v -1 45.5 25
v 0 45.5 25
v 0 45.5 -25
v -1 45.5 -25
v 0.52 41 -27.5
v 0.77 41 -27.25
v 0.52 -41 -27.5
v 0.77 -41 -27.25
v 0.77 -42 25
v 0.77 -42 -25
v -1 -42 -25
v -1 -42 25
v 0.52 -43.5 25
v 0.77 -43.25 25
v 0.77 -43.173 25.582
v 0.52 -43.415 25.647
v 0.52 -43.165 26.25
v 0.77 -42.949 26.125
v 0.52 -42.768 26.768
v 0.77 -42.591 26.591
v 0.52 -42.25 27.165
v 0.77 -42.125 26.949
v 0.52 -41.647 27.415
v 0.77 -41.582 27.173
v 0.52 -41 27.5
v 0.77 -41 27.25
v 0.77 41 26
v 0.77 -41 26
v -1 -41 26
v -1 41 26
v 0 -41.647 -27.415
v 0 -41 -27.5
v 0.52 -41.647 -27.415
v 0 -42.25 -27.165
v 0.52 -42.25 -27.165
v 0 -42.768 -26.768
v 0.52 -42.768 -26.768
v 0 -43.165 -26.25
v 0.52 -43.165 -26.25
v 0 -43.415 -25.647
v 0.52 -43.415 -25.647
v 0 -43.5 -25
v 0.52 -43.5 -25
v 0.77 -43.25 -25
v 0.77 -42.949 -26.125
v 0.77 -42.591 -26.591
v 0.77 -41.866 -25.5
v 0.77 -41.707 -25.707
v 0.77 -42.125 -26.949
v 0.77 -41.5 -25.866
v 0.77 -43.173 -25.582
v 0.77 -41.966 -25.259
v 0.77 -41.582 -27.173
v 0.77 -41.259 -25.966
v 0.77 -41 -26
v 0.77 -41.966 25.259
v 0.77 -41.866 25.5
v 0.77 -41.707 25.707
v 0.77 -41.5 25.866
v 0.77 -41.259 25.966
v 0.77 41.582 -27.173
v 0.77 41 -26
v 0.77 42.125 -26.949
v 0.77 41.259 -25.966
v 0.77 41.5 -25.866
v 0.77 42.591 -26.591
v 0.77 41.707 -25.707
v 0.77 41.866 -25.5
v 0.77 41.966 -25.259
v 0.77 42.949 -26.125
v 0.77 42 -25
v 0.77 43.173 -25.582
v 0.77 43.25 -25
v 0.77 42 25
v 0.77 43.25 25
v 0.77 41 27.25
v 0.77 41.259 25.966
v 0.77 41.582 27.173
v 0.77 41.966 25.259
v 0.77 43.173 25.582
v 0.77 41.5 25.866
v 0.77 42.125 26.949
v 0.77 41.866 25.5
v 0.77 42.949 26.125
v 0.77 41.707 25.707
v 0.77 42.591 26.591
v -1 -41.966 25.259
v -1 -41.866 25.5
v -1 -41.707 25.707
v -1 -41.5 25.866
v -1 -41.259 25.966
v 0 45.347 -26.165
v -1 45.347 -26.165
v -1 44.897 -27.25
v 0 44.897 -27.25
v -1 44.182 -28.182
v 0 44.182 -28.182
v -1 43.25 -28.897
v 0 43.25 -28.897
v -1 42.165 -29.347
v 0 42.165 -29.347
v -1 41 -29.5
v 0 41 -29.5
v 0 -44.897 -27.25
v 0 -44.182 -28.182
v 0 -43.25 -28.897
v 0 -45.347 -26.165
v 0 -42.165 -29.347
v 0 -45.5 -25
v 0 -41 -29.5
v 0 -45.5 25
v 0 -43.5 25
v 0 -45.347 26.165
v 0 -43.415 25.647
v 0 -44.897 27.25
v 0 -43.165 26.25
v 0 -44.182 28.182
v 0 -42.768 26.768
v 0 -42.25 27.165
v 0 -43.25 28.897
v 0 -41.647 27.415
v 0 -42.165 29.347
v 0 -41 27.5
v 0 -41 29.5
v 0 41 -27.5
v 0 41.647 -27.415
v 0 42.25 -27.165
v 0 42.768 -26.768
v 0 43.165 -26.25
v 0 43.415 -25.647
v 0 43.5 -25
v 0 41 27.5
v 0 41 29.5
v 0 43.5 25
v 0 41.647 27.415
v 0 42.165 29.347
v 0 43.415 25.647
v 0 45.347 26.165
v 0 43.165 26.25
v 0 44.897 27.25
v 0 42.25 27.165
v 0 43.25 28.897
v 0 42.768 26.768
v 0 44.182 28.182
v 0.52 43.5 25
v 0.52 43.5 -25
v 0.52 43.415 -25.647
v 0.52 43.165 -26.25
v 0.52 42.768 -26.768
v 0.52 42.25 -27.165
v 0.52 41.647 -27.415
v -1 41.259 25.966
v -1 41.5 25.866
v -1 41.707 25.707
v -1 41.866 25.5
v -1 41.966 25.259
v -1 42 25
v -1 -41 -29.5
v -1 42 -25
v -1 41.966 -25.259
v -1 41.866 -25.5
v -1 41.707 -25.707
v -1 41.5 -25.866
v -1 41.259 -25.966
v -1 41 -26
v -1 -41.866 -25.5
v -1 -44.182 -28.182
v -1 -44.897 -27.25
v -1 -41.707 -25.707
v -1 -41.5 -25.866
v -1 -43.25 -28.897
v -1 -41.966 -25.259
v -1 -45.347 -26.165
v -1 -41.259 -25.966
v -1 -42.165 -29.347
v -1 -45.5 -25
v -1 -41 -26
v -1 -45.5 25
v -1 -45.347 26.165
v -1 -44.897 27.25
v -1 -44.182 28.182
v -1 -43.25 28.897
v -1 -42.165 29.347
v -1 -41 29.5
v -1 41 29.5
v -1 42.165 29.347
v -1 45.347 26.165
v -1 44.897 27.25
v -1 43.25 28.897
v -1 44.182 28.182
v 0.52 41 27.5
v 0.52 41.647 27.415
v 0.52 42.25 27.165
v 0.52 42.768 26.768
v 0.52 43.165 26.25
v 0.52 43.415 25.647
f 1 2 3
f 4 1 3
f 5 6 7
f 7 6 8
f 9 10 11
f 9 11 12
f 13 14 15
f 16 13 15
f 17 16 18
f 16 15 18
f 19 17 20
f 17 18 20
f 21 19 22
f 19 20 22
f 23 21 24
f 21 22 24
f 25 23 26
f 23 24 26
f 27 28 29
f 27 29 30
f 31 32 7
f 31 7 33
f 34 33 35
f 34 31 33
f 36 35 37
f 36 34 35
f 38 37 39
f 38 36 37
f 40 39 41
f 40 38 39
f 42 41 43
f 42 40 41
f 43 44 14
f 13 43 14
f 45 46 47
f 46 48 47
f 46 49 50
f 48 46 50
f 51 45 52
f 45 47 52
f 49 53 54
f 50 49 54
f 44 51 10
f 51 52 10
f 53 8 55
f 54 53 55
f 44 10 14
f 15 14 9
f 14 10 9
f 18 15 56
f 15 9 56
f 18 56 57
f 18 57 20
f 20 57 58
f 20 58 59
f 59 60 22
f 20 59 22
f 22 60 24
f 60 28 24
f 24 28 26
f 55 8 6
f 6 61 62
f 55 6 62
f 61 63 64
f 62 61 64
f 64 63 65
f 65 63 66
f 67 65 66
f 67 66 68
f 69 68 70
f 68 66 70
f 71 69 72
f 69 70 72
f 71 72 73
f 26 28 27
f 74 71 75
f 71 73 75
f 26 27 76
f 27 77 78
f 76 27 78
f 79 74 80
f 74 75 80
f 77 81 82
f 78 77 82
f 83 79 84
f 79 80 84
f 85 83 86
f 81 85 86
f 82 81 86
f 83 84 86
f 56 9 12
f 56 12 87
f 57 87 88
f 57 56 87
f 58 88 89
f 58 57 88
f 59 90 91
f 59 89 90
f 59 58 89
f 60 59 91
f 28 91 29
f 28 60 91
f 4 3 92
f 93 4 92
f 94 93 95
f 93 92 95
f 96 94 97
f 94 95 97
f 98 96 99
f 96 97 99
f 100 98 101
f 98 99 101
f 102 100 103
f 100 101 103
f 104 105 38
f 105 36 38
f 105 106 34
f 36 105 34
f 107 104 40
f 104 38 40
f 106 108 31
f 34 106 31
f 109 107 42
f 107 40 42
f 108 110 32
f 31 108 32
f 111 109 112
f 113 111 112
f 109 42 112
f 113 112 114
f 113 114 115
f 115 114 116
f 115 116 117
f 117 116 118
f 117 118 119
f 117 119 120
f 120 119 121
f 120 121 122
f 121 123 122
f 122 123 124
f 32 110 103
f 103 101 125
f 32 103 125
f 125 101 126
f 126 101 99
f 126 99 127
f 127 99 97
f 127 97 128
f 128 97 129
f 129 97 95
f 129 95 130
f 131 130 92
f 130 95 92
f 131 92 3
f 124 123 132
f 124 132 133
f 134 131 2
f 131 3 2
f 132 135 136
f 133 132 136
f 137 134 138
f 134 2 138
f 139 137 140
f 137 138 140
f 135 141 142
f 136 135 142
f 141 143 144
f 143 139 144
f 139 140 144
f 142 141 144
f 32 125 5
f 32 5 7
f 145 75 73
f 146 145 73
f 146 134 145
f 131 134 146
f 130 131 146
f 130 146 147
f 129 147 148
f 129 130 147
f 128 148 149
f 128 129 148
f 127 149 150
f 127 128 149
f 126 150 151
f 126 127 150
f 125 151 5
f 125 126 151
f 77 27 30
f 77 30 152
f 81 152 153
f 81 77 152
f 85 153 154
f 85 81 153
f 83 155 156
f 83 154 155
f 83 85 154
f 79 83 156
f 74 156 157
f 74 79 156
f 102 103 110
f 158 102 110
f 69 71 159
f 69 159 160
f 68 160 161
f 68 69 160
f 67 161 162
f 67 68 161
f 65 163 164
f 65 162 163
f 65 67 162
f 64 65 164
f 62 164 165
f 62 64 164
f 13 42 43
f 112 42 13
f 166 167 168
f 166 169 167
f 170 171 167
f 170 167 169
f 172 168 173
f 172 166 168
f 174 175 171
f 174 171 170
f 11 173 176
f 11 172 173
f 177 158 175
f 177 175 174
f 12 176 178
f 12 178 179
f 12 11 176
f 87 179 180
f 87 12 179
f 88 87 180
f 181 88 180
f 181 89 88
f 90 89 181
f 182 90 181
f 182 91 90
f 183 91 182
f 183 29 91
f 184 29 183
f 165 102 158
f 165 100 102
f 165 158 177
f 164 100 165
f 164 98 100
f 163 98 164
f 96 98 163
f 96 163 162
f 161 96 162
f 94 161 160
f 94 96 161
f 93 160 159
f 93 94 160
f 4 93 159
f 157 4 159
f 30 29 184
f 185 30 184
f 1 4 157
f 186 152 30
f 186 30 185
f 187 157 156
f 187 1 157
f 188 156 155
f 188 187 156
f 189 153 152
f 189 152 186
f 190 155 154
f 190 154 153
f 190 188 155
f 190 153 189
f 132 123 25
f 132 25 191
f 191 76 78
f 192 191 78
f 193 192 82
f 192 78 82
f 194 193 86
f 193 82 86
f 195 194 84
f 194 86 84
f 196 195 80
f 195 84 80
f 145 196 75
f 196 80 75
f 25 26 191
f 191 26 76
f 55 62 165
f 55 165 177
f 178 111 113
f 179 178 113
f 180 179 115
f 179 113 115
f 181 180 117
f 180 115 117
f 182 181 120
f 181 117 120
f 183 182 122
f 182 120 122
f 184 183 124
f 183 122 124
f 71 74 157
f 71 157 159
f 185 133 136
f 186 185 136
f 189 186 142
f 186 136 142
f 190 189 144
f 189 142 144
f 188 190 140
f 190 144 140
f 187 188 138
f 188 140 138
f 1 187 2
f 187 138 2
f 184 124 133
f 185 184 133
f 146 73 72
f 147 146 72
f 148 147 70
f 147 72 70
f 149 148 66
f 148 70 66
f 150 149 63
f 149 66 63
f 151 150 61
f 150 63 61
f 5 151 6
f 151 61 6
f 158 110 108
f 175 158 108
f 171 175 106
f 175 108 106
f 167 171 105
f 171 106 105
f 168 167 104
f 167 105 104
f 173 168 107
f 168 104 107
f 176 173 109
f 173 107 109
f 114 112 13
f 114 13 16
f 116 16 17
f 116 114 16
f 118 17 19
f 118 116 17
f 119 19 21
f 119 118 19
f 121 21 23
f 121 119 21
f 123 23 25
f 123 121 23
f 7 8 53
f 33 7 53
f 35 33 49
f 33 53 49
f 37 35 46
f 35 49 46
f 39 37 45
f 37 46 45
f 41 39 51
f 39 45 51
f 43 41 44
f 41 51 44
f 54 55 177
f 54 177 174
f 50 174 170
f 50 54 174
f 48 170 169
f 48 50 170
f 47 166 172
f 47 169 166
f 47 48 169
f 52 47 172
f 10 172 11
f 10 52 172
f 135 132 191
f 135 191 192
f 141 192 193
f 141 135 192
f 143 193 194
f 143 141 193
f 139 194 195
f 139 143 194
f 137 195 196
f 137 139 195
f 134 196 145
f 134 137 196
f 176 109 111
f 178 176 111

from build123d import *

# Parameters (mm, degrees)
BOSS_EXTRUDE1_DEPTH     = 0.77
BOSS_EXTRUDE2_DEPTH     = 1
CUT_EXTRUDE1_DEPTH      = 55.235597166
CUT_EXTRUDE1_DEPTH_BACK = 55.235597166
CHAMFER1_SIZE           = 0.25


with BuildPart() as part:
    # Sketch2 → Boss-Extrude1 (new body)
    with BuildSketch(Plane.ZY):
        with BuildLine():
            Line((-27.5, 41), (-27.5, -41))
            ThreePointArc((-27.5, -41), (-26.767766953, -42.767766953), (-25, -43.5))
            Line((-25, -43.5), (25, -43.5))
            ThreePointArc((25, -43.5), (26.767766953, -42.767766953), (27.5, -41))
            Line((27.5, -41), (27.5, 41))
            ThreePointArc((27.5, 41), (26.767766953, 42.767766953), (25, 43.5))
            Line((25, 43.5), (-25, 43.5))
            ThreePointArc((-25, 43.5), (-26.767766953, 42.767766953), (-27.5, 41))
        make_face()
    extrude(amount=-BOSS_EXTRUDE1_DEPTH)

    # Sketch3 → Boss-Extrude2 (add)
    with BuildSketch(Plane.ZY):
        with BuildLine():
            Line((-29.5, 41), (-29.5, -41))
            ThreePointArc((-29.5, -41), (-28.181980515, -44.181980515), (-25, -45.5))
            Line((-25, -45.5), (25, -45.5))
            ThreePointArc((25, -45.5), (28.181980515, -44.181980515), (29.5, -41))
            Line((29.5, -41), (29.5, 41))
            ThreePointArc((29.5, 41), (28.181980515, 44.181980515), (25, 45.5))
            Line((25, 45.5), (-25, 45.5))
            ThreePointArc((-25, 45.5), (-28.181980515, 44.181980515), (-29.5, 41))
        make_face()
    extrude(amount=BOSS_EXTRUDE2_DEPTH)

    # Sketch3<3> → Cut-Extrude1 (cut, two sides: drawn at the far end of the back side and taken through both)
    with BuildSketch(Plane.ZY.offset(-CUT_EXTRUDE1_DEPTH_BACK)):
        with BuildLine():
            Line((25, 41.999999952), (-25, 41.999999952))
            ThreePointArc((-25, 41.999999952), (-25.707106747, 41.707106747), (-25.999999952, 41))
            Line((-25.999999952, 41), (-25.999999952, -41))
            ThreePointArc((-25.999999952, -41), (-25.707106747, -41.707106747), (-25, -41.999999952))
            Line((-25, -41.999999952), (25, -41.999999952))
            ThreePointArc((25, -41.999999952), (25.707106747, -41.707106747), (25.999999952, -41))
            Line((25.999999952, -41), (25.999999952, 41))
            ThreePointArc((25.999999952, 41), (25.707106747, 41.707106747), (25, 41.999999952))
        make_face()
    extrude(amount=CUT_EXTRUDE1_DEPTH + CUT_EXTRUDE1_DEPTH_BACK, mode=Mode.SUBTRACT)

    # Chamfer1
    chamfer1_edges = [part.edges().sort_by_distance(p)[0] for p in [
        (0.77, -43.5, 0),
        (0.77, -42.767766953, 26.767766953),
        (0.77, 0, 27.5),
        (0.77, 42.767766953, 26.767766953),
        (0.77, 43.5, 0),
        (0.77, 42.767766953, -26.767766953),
        (0.77, 0, -27.5),
        (0.77, -42.767766953, -26.767766953),
    ]]
    chamfer(chamfer1_edges, length=CHAMFER1_SIZE)


solid = part.part
